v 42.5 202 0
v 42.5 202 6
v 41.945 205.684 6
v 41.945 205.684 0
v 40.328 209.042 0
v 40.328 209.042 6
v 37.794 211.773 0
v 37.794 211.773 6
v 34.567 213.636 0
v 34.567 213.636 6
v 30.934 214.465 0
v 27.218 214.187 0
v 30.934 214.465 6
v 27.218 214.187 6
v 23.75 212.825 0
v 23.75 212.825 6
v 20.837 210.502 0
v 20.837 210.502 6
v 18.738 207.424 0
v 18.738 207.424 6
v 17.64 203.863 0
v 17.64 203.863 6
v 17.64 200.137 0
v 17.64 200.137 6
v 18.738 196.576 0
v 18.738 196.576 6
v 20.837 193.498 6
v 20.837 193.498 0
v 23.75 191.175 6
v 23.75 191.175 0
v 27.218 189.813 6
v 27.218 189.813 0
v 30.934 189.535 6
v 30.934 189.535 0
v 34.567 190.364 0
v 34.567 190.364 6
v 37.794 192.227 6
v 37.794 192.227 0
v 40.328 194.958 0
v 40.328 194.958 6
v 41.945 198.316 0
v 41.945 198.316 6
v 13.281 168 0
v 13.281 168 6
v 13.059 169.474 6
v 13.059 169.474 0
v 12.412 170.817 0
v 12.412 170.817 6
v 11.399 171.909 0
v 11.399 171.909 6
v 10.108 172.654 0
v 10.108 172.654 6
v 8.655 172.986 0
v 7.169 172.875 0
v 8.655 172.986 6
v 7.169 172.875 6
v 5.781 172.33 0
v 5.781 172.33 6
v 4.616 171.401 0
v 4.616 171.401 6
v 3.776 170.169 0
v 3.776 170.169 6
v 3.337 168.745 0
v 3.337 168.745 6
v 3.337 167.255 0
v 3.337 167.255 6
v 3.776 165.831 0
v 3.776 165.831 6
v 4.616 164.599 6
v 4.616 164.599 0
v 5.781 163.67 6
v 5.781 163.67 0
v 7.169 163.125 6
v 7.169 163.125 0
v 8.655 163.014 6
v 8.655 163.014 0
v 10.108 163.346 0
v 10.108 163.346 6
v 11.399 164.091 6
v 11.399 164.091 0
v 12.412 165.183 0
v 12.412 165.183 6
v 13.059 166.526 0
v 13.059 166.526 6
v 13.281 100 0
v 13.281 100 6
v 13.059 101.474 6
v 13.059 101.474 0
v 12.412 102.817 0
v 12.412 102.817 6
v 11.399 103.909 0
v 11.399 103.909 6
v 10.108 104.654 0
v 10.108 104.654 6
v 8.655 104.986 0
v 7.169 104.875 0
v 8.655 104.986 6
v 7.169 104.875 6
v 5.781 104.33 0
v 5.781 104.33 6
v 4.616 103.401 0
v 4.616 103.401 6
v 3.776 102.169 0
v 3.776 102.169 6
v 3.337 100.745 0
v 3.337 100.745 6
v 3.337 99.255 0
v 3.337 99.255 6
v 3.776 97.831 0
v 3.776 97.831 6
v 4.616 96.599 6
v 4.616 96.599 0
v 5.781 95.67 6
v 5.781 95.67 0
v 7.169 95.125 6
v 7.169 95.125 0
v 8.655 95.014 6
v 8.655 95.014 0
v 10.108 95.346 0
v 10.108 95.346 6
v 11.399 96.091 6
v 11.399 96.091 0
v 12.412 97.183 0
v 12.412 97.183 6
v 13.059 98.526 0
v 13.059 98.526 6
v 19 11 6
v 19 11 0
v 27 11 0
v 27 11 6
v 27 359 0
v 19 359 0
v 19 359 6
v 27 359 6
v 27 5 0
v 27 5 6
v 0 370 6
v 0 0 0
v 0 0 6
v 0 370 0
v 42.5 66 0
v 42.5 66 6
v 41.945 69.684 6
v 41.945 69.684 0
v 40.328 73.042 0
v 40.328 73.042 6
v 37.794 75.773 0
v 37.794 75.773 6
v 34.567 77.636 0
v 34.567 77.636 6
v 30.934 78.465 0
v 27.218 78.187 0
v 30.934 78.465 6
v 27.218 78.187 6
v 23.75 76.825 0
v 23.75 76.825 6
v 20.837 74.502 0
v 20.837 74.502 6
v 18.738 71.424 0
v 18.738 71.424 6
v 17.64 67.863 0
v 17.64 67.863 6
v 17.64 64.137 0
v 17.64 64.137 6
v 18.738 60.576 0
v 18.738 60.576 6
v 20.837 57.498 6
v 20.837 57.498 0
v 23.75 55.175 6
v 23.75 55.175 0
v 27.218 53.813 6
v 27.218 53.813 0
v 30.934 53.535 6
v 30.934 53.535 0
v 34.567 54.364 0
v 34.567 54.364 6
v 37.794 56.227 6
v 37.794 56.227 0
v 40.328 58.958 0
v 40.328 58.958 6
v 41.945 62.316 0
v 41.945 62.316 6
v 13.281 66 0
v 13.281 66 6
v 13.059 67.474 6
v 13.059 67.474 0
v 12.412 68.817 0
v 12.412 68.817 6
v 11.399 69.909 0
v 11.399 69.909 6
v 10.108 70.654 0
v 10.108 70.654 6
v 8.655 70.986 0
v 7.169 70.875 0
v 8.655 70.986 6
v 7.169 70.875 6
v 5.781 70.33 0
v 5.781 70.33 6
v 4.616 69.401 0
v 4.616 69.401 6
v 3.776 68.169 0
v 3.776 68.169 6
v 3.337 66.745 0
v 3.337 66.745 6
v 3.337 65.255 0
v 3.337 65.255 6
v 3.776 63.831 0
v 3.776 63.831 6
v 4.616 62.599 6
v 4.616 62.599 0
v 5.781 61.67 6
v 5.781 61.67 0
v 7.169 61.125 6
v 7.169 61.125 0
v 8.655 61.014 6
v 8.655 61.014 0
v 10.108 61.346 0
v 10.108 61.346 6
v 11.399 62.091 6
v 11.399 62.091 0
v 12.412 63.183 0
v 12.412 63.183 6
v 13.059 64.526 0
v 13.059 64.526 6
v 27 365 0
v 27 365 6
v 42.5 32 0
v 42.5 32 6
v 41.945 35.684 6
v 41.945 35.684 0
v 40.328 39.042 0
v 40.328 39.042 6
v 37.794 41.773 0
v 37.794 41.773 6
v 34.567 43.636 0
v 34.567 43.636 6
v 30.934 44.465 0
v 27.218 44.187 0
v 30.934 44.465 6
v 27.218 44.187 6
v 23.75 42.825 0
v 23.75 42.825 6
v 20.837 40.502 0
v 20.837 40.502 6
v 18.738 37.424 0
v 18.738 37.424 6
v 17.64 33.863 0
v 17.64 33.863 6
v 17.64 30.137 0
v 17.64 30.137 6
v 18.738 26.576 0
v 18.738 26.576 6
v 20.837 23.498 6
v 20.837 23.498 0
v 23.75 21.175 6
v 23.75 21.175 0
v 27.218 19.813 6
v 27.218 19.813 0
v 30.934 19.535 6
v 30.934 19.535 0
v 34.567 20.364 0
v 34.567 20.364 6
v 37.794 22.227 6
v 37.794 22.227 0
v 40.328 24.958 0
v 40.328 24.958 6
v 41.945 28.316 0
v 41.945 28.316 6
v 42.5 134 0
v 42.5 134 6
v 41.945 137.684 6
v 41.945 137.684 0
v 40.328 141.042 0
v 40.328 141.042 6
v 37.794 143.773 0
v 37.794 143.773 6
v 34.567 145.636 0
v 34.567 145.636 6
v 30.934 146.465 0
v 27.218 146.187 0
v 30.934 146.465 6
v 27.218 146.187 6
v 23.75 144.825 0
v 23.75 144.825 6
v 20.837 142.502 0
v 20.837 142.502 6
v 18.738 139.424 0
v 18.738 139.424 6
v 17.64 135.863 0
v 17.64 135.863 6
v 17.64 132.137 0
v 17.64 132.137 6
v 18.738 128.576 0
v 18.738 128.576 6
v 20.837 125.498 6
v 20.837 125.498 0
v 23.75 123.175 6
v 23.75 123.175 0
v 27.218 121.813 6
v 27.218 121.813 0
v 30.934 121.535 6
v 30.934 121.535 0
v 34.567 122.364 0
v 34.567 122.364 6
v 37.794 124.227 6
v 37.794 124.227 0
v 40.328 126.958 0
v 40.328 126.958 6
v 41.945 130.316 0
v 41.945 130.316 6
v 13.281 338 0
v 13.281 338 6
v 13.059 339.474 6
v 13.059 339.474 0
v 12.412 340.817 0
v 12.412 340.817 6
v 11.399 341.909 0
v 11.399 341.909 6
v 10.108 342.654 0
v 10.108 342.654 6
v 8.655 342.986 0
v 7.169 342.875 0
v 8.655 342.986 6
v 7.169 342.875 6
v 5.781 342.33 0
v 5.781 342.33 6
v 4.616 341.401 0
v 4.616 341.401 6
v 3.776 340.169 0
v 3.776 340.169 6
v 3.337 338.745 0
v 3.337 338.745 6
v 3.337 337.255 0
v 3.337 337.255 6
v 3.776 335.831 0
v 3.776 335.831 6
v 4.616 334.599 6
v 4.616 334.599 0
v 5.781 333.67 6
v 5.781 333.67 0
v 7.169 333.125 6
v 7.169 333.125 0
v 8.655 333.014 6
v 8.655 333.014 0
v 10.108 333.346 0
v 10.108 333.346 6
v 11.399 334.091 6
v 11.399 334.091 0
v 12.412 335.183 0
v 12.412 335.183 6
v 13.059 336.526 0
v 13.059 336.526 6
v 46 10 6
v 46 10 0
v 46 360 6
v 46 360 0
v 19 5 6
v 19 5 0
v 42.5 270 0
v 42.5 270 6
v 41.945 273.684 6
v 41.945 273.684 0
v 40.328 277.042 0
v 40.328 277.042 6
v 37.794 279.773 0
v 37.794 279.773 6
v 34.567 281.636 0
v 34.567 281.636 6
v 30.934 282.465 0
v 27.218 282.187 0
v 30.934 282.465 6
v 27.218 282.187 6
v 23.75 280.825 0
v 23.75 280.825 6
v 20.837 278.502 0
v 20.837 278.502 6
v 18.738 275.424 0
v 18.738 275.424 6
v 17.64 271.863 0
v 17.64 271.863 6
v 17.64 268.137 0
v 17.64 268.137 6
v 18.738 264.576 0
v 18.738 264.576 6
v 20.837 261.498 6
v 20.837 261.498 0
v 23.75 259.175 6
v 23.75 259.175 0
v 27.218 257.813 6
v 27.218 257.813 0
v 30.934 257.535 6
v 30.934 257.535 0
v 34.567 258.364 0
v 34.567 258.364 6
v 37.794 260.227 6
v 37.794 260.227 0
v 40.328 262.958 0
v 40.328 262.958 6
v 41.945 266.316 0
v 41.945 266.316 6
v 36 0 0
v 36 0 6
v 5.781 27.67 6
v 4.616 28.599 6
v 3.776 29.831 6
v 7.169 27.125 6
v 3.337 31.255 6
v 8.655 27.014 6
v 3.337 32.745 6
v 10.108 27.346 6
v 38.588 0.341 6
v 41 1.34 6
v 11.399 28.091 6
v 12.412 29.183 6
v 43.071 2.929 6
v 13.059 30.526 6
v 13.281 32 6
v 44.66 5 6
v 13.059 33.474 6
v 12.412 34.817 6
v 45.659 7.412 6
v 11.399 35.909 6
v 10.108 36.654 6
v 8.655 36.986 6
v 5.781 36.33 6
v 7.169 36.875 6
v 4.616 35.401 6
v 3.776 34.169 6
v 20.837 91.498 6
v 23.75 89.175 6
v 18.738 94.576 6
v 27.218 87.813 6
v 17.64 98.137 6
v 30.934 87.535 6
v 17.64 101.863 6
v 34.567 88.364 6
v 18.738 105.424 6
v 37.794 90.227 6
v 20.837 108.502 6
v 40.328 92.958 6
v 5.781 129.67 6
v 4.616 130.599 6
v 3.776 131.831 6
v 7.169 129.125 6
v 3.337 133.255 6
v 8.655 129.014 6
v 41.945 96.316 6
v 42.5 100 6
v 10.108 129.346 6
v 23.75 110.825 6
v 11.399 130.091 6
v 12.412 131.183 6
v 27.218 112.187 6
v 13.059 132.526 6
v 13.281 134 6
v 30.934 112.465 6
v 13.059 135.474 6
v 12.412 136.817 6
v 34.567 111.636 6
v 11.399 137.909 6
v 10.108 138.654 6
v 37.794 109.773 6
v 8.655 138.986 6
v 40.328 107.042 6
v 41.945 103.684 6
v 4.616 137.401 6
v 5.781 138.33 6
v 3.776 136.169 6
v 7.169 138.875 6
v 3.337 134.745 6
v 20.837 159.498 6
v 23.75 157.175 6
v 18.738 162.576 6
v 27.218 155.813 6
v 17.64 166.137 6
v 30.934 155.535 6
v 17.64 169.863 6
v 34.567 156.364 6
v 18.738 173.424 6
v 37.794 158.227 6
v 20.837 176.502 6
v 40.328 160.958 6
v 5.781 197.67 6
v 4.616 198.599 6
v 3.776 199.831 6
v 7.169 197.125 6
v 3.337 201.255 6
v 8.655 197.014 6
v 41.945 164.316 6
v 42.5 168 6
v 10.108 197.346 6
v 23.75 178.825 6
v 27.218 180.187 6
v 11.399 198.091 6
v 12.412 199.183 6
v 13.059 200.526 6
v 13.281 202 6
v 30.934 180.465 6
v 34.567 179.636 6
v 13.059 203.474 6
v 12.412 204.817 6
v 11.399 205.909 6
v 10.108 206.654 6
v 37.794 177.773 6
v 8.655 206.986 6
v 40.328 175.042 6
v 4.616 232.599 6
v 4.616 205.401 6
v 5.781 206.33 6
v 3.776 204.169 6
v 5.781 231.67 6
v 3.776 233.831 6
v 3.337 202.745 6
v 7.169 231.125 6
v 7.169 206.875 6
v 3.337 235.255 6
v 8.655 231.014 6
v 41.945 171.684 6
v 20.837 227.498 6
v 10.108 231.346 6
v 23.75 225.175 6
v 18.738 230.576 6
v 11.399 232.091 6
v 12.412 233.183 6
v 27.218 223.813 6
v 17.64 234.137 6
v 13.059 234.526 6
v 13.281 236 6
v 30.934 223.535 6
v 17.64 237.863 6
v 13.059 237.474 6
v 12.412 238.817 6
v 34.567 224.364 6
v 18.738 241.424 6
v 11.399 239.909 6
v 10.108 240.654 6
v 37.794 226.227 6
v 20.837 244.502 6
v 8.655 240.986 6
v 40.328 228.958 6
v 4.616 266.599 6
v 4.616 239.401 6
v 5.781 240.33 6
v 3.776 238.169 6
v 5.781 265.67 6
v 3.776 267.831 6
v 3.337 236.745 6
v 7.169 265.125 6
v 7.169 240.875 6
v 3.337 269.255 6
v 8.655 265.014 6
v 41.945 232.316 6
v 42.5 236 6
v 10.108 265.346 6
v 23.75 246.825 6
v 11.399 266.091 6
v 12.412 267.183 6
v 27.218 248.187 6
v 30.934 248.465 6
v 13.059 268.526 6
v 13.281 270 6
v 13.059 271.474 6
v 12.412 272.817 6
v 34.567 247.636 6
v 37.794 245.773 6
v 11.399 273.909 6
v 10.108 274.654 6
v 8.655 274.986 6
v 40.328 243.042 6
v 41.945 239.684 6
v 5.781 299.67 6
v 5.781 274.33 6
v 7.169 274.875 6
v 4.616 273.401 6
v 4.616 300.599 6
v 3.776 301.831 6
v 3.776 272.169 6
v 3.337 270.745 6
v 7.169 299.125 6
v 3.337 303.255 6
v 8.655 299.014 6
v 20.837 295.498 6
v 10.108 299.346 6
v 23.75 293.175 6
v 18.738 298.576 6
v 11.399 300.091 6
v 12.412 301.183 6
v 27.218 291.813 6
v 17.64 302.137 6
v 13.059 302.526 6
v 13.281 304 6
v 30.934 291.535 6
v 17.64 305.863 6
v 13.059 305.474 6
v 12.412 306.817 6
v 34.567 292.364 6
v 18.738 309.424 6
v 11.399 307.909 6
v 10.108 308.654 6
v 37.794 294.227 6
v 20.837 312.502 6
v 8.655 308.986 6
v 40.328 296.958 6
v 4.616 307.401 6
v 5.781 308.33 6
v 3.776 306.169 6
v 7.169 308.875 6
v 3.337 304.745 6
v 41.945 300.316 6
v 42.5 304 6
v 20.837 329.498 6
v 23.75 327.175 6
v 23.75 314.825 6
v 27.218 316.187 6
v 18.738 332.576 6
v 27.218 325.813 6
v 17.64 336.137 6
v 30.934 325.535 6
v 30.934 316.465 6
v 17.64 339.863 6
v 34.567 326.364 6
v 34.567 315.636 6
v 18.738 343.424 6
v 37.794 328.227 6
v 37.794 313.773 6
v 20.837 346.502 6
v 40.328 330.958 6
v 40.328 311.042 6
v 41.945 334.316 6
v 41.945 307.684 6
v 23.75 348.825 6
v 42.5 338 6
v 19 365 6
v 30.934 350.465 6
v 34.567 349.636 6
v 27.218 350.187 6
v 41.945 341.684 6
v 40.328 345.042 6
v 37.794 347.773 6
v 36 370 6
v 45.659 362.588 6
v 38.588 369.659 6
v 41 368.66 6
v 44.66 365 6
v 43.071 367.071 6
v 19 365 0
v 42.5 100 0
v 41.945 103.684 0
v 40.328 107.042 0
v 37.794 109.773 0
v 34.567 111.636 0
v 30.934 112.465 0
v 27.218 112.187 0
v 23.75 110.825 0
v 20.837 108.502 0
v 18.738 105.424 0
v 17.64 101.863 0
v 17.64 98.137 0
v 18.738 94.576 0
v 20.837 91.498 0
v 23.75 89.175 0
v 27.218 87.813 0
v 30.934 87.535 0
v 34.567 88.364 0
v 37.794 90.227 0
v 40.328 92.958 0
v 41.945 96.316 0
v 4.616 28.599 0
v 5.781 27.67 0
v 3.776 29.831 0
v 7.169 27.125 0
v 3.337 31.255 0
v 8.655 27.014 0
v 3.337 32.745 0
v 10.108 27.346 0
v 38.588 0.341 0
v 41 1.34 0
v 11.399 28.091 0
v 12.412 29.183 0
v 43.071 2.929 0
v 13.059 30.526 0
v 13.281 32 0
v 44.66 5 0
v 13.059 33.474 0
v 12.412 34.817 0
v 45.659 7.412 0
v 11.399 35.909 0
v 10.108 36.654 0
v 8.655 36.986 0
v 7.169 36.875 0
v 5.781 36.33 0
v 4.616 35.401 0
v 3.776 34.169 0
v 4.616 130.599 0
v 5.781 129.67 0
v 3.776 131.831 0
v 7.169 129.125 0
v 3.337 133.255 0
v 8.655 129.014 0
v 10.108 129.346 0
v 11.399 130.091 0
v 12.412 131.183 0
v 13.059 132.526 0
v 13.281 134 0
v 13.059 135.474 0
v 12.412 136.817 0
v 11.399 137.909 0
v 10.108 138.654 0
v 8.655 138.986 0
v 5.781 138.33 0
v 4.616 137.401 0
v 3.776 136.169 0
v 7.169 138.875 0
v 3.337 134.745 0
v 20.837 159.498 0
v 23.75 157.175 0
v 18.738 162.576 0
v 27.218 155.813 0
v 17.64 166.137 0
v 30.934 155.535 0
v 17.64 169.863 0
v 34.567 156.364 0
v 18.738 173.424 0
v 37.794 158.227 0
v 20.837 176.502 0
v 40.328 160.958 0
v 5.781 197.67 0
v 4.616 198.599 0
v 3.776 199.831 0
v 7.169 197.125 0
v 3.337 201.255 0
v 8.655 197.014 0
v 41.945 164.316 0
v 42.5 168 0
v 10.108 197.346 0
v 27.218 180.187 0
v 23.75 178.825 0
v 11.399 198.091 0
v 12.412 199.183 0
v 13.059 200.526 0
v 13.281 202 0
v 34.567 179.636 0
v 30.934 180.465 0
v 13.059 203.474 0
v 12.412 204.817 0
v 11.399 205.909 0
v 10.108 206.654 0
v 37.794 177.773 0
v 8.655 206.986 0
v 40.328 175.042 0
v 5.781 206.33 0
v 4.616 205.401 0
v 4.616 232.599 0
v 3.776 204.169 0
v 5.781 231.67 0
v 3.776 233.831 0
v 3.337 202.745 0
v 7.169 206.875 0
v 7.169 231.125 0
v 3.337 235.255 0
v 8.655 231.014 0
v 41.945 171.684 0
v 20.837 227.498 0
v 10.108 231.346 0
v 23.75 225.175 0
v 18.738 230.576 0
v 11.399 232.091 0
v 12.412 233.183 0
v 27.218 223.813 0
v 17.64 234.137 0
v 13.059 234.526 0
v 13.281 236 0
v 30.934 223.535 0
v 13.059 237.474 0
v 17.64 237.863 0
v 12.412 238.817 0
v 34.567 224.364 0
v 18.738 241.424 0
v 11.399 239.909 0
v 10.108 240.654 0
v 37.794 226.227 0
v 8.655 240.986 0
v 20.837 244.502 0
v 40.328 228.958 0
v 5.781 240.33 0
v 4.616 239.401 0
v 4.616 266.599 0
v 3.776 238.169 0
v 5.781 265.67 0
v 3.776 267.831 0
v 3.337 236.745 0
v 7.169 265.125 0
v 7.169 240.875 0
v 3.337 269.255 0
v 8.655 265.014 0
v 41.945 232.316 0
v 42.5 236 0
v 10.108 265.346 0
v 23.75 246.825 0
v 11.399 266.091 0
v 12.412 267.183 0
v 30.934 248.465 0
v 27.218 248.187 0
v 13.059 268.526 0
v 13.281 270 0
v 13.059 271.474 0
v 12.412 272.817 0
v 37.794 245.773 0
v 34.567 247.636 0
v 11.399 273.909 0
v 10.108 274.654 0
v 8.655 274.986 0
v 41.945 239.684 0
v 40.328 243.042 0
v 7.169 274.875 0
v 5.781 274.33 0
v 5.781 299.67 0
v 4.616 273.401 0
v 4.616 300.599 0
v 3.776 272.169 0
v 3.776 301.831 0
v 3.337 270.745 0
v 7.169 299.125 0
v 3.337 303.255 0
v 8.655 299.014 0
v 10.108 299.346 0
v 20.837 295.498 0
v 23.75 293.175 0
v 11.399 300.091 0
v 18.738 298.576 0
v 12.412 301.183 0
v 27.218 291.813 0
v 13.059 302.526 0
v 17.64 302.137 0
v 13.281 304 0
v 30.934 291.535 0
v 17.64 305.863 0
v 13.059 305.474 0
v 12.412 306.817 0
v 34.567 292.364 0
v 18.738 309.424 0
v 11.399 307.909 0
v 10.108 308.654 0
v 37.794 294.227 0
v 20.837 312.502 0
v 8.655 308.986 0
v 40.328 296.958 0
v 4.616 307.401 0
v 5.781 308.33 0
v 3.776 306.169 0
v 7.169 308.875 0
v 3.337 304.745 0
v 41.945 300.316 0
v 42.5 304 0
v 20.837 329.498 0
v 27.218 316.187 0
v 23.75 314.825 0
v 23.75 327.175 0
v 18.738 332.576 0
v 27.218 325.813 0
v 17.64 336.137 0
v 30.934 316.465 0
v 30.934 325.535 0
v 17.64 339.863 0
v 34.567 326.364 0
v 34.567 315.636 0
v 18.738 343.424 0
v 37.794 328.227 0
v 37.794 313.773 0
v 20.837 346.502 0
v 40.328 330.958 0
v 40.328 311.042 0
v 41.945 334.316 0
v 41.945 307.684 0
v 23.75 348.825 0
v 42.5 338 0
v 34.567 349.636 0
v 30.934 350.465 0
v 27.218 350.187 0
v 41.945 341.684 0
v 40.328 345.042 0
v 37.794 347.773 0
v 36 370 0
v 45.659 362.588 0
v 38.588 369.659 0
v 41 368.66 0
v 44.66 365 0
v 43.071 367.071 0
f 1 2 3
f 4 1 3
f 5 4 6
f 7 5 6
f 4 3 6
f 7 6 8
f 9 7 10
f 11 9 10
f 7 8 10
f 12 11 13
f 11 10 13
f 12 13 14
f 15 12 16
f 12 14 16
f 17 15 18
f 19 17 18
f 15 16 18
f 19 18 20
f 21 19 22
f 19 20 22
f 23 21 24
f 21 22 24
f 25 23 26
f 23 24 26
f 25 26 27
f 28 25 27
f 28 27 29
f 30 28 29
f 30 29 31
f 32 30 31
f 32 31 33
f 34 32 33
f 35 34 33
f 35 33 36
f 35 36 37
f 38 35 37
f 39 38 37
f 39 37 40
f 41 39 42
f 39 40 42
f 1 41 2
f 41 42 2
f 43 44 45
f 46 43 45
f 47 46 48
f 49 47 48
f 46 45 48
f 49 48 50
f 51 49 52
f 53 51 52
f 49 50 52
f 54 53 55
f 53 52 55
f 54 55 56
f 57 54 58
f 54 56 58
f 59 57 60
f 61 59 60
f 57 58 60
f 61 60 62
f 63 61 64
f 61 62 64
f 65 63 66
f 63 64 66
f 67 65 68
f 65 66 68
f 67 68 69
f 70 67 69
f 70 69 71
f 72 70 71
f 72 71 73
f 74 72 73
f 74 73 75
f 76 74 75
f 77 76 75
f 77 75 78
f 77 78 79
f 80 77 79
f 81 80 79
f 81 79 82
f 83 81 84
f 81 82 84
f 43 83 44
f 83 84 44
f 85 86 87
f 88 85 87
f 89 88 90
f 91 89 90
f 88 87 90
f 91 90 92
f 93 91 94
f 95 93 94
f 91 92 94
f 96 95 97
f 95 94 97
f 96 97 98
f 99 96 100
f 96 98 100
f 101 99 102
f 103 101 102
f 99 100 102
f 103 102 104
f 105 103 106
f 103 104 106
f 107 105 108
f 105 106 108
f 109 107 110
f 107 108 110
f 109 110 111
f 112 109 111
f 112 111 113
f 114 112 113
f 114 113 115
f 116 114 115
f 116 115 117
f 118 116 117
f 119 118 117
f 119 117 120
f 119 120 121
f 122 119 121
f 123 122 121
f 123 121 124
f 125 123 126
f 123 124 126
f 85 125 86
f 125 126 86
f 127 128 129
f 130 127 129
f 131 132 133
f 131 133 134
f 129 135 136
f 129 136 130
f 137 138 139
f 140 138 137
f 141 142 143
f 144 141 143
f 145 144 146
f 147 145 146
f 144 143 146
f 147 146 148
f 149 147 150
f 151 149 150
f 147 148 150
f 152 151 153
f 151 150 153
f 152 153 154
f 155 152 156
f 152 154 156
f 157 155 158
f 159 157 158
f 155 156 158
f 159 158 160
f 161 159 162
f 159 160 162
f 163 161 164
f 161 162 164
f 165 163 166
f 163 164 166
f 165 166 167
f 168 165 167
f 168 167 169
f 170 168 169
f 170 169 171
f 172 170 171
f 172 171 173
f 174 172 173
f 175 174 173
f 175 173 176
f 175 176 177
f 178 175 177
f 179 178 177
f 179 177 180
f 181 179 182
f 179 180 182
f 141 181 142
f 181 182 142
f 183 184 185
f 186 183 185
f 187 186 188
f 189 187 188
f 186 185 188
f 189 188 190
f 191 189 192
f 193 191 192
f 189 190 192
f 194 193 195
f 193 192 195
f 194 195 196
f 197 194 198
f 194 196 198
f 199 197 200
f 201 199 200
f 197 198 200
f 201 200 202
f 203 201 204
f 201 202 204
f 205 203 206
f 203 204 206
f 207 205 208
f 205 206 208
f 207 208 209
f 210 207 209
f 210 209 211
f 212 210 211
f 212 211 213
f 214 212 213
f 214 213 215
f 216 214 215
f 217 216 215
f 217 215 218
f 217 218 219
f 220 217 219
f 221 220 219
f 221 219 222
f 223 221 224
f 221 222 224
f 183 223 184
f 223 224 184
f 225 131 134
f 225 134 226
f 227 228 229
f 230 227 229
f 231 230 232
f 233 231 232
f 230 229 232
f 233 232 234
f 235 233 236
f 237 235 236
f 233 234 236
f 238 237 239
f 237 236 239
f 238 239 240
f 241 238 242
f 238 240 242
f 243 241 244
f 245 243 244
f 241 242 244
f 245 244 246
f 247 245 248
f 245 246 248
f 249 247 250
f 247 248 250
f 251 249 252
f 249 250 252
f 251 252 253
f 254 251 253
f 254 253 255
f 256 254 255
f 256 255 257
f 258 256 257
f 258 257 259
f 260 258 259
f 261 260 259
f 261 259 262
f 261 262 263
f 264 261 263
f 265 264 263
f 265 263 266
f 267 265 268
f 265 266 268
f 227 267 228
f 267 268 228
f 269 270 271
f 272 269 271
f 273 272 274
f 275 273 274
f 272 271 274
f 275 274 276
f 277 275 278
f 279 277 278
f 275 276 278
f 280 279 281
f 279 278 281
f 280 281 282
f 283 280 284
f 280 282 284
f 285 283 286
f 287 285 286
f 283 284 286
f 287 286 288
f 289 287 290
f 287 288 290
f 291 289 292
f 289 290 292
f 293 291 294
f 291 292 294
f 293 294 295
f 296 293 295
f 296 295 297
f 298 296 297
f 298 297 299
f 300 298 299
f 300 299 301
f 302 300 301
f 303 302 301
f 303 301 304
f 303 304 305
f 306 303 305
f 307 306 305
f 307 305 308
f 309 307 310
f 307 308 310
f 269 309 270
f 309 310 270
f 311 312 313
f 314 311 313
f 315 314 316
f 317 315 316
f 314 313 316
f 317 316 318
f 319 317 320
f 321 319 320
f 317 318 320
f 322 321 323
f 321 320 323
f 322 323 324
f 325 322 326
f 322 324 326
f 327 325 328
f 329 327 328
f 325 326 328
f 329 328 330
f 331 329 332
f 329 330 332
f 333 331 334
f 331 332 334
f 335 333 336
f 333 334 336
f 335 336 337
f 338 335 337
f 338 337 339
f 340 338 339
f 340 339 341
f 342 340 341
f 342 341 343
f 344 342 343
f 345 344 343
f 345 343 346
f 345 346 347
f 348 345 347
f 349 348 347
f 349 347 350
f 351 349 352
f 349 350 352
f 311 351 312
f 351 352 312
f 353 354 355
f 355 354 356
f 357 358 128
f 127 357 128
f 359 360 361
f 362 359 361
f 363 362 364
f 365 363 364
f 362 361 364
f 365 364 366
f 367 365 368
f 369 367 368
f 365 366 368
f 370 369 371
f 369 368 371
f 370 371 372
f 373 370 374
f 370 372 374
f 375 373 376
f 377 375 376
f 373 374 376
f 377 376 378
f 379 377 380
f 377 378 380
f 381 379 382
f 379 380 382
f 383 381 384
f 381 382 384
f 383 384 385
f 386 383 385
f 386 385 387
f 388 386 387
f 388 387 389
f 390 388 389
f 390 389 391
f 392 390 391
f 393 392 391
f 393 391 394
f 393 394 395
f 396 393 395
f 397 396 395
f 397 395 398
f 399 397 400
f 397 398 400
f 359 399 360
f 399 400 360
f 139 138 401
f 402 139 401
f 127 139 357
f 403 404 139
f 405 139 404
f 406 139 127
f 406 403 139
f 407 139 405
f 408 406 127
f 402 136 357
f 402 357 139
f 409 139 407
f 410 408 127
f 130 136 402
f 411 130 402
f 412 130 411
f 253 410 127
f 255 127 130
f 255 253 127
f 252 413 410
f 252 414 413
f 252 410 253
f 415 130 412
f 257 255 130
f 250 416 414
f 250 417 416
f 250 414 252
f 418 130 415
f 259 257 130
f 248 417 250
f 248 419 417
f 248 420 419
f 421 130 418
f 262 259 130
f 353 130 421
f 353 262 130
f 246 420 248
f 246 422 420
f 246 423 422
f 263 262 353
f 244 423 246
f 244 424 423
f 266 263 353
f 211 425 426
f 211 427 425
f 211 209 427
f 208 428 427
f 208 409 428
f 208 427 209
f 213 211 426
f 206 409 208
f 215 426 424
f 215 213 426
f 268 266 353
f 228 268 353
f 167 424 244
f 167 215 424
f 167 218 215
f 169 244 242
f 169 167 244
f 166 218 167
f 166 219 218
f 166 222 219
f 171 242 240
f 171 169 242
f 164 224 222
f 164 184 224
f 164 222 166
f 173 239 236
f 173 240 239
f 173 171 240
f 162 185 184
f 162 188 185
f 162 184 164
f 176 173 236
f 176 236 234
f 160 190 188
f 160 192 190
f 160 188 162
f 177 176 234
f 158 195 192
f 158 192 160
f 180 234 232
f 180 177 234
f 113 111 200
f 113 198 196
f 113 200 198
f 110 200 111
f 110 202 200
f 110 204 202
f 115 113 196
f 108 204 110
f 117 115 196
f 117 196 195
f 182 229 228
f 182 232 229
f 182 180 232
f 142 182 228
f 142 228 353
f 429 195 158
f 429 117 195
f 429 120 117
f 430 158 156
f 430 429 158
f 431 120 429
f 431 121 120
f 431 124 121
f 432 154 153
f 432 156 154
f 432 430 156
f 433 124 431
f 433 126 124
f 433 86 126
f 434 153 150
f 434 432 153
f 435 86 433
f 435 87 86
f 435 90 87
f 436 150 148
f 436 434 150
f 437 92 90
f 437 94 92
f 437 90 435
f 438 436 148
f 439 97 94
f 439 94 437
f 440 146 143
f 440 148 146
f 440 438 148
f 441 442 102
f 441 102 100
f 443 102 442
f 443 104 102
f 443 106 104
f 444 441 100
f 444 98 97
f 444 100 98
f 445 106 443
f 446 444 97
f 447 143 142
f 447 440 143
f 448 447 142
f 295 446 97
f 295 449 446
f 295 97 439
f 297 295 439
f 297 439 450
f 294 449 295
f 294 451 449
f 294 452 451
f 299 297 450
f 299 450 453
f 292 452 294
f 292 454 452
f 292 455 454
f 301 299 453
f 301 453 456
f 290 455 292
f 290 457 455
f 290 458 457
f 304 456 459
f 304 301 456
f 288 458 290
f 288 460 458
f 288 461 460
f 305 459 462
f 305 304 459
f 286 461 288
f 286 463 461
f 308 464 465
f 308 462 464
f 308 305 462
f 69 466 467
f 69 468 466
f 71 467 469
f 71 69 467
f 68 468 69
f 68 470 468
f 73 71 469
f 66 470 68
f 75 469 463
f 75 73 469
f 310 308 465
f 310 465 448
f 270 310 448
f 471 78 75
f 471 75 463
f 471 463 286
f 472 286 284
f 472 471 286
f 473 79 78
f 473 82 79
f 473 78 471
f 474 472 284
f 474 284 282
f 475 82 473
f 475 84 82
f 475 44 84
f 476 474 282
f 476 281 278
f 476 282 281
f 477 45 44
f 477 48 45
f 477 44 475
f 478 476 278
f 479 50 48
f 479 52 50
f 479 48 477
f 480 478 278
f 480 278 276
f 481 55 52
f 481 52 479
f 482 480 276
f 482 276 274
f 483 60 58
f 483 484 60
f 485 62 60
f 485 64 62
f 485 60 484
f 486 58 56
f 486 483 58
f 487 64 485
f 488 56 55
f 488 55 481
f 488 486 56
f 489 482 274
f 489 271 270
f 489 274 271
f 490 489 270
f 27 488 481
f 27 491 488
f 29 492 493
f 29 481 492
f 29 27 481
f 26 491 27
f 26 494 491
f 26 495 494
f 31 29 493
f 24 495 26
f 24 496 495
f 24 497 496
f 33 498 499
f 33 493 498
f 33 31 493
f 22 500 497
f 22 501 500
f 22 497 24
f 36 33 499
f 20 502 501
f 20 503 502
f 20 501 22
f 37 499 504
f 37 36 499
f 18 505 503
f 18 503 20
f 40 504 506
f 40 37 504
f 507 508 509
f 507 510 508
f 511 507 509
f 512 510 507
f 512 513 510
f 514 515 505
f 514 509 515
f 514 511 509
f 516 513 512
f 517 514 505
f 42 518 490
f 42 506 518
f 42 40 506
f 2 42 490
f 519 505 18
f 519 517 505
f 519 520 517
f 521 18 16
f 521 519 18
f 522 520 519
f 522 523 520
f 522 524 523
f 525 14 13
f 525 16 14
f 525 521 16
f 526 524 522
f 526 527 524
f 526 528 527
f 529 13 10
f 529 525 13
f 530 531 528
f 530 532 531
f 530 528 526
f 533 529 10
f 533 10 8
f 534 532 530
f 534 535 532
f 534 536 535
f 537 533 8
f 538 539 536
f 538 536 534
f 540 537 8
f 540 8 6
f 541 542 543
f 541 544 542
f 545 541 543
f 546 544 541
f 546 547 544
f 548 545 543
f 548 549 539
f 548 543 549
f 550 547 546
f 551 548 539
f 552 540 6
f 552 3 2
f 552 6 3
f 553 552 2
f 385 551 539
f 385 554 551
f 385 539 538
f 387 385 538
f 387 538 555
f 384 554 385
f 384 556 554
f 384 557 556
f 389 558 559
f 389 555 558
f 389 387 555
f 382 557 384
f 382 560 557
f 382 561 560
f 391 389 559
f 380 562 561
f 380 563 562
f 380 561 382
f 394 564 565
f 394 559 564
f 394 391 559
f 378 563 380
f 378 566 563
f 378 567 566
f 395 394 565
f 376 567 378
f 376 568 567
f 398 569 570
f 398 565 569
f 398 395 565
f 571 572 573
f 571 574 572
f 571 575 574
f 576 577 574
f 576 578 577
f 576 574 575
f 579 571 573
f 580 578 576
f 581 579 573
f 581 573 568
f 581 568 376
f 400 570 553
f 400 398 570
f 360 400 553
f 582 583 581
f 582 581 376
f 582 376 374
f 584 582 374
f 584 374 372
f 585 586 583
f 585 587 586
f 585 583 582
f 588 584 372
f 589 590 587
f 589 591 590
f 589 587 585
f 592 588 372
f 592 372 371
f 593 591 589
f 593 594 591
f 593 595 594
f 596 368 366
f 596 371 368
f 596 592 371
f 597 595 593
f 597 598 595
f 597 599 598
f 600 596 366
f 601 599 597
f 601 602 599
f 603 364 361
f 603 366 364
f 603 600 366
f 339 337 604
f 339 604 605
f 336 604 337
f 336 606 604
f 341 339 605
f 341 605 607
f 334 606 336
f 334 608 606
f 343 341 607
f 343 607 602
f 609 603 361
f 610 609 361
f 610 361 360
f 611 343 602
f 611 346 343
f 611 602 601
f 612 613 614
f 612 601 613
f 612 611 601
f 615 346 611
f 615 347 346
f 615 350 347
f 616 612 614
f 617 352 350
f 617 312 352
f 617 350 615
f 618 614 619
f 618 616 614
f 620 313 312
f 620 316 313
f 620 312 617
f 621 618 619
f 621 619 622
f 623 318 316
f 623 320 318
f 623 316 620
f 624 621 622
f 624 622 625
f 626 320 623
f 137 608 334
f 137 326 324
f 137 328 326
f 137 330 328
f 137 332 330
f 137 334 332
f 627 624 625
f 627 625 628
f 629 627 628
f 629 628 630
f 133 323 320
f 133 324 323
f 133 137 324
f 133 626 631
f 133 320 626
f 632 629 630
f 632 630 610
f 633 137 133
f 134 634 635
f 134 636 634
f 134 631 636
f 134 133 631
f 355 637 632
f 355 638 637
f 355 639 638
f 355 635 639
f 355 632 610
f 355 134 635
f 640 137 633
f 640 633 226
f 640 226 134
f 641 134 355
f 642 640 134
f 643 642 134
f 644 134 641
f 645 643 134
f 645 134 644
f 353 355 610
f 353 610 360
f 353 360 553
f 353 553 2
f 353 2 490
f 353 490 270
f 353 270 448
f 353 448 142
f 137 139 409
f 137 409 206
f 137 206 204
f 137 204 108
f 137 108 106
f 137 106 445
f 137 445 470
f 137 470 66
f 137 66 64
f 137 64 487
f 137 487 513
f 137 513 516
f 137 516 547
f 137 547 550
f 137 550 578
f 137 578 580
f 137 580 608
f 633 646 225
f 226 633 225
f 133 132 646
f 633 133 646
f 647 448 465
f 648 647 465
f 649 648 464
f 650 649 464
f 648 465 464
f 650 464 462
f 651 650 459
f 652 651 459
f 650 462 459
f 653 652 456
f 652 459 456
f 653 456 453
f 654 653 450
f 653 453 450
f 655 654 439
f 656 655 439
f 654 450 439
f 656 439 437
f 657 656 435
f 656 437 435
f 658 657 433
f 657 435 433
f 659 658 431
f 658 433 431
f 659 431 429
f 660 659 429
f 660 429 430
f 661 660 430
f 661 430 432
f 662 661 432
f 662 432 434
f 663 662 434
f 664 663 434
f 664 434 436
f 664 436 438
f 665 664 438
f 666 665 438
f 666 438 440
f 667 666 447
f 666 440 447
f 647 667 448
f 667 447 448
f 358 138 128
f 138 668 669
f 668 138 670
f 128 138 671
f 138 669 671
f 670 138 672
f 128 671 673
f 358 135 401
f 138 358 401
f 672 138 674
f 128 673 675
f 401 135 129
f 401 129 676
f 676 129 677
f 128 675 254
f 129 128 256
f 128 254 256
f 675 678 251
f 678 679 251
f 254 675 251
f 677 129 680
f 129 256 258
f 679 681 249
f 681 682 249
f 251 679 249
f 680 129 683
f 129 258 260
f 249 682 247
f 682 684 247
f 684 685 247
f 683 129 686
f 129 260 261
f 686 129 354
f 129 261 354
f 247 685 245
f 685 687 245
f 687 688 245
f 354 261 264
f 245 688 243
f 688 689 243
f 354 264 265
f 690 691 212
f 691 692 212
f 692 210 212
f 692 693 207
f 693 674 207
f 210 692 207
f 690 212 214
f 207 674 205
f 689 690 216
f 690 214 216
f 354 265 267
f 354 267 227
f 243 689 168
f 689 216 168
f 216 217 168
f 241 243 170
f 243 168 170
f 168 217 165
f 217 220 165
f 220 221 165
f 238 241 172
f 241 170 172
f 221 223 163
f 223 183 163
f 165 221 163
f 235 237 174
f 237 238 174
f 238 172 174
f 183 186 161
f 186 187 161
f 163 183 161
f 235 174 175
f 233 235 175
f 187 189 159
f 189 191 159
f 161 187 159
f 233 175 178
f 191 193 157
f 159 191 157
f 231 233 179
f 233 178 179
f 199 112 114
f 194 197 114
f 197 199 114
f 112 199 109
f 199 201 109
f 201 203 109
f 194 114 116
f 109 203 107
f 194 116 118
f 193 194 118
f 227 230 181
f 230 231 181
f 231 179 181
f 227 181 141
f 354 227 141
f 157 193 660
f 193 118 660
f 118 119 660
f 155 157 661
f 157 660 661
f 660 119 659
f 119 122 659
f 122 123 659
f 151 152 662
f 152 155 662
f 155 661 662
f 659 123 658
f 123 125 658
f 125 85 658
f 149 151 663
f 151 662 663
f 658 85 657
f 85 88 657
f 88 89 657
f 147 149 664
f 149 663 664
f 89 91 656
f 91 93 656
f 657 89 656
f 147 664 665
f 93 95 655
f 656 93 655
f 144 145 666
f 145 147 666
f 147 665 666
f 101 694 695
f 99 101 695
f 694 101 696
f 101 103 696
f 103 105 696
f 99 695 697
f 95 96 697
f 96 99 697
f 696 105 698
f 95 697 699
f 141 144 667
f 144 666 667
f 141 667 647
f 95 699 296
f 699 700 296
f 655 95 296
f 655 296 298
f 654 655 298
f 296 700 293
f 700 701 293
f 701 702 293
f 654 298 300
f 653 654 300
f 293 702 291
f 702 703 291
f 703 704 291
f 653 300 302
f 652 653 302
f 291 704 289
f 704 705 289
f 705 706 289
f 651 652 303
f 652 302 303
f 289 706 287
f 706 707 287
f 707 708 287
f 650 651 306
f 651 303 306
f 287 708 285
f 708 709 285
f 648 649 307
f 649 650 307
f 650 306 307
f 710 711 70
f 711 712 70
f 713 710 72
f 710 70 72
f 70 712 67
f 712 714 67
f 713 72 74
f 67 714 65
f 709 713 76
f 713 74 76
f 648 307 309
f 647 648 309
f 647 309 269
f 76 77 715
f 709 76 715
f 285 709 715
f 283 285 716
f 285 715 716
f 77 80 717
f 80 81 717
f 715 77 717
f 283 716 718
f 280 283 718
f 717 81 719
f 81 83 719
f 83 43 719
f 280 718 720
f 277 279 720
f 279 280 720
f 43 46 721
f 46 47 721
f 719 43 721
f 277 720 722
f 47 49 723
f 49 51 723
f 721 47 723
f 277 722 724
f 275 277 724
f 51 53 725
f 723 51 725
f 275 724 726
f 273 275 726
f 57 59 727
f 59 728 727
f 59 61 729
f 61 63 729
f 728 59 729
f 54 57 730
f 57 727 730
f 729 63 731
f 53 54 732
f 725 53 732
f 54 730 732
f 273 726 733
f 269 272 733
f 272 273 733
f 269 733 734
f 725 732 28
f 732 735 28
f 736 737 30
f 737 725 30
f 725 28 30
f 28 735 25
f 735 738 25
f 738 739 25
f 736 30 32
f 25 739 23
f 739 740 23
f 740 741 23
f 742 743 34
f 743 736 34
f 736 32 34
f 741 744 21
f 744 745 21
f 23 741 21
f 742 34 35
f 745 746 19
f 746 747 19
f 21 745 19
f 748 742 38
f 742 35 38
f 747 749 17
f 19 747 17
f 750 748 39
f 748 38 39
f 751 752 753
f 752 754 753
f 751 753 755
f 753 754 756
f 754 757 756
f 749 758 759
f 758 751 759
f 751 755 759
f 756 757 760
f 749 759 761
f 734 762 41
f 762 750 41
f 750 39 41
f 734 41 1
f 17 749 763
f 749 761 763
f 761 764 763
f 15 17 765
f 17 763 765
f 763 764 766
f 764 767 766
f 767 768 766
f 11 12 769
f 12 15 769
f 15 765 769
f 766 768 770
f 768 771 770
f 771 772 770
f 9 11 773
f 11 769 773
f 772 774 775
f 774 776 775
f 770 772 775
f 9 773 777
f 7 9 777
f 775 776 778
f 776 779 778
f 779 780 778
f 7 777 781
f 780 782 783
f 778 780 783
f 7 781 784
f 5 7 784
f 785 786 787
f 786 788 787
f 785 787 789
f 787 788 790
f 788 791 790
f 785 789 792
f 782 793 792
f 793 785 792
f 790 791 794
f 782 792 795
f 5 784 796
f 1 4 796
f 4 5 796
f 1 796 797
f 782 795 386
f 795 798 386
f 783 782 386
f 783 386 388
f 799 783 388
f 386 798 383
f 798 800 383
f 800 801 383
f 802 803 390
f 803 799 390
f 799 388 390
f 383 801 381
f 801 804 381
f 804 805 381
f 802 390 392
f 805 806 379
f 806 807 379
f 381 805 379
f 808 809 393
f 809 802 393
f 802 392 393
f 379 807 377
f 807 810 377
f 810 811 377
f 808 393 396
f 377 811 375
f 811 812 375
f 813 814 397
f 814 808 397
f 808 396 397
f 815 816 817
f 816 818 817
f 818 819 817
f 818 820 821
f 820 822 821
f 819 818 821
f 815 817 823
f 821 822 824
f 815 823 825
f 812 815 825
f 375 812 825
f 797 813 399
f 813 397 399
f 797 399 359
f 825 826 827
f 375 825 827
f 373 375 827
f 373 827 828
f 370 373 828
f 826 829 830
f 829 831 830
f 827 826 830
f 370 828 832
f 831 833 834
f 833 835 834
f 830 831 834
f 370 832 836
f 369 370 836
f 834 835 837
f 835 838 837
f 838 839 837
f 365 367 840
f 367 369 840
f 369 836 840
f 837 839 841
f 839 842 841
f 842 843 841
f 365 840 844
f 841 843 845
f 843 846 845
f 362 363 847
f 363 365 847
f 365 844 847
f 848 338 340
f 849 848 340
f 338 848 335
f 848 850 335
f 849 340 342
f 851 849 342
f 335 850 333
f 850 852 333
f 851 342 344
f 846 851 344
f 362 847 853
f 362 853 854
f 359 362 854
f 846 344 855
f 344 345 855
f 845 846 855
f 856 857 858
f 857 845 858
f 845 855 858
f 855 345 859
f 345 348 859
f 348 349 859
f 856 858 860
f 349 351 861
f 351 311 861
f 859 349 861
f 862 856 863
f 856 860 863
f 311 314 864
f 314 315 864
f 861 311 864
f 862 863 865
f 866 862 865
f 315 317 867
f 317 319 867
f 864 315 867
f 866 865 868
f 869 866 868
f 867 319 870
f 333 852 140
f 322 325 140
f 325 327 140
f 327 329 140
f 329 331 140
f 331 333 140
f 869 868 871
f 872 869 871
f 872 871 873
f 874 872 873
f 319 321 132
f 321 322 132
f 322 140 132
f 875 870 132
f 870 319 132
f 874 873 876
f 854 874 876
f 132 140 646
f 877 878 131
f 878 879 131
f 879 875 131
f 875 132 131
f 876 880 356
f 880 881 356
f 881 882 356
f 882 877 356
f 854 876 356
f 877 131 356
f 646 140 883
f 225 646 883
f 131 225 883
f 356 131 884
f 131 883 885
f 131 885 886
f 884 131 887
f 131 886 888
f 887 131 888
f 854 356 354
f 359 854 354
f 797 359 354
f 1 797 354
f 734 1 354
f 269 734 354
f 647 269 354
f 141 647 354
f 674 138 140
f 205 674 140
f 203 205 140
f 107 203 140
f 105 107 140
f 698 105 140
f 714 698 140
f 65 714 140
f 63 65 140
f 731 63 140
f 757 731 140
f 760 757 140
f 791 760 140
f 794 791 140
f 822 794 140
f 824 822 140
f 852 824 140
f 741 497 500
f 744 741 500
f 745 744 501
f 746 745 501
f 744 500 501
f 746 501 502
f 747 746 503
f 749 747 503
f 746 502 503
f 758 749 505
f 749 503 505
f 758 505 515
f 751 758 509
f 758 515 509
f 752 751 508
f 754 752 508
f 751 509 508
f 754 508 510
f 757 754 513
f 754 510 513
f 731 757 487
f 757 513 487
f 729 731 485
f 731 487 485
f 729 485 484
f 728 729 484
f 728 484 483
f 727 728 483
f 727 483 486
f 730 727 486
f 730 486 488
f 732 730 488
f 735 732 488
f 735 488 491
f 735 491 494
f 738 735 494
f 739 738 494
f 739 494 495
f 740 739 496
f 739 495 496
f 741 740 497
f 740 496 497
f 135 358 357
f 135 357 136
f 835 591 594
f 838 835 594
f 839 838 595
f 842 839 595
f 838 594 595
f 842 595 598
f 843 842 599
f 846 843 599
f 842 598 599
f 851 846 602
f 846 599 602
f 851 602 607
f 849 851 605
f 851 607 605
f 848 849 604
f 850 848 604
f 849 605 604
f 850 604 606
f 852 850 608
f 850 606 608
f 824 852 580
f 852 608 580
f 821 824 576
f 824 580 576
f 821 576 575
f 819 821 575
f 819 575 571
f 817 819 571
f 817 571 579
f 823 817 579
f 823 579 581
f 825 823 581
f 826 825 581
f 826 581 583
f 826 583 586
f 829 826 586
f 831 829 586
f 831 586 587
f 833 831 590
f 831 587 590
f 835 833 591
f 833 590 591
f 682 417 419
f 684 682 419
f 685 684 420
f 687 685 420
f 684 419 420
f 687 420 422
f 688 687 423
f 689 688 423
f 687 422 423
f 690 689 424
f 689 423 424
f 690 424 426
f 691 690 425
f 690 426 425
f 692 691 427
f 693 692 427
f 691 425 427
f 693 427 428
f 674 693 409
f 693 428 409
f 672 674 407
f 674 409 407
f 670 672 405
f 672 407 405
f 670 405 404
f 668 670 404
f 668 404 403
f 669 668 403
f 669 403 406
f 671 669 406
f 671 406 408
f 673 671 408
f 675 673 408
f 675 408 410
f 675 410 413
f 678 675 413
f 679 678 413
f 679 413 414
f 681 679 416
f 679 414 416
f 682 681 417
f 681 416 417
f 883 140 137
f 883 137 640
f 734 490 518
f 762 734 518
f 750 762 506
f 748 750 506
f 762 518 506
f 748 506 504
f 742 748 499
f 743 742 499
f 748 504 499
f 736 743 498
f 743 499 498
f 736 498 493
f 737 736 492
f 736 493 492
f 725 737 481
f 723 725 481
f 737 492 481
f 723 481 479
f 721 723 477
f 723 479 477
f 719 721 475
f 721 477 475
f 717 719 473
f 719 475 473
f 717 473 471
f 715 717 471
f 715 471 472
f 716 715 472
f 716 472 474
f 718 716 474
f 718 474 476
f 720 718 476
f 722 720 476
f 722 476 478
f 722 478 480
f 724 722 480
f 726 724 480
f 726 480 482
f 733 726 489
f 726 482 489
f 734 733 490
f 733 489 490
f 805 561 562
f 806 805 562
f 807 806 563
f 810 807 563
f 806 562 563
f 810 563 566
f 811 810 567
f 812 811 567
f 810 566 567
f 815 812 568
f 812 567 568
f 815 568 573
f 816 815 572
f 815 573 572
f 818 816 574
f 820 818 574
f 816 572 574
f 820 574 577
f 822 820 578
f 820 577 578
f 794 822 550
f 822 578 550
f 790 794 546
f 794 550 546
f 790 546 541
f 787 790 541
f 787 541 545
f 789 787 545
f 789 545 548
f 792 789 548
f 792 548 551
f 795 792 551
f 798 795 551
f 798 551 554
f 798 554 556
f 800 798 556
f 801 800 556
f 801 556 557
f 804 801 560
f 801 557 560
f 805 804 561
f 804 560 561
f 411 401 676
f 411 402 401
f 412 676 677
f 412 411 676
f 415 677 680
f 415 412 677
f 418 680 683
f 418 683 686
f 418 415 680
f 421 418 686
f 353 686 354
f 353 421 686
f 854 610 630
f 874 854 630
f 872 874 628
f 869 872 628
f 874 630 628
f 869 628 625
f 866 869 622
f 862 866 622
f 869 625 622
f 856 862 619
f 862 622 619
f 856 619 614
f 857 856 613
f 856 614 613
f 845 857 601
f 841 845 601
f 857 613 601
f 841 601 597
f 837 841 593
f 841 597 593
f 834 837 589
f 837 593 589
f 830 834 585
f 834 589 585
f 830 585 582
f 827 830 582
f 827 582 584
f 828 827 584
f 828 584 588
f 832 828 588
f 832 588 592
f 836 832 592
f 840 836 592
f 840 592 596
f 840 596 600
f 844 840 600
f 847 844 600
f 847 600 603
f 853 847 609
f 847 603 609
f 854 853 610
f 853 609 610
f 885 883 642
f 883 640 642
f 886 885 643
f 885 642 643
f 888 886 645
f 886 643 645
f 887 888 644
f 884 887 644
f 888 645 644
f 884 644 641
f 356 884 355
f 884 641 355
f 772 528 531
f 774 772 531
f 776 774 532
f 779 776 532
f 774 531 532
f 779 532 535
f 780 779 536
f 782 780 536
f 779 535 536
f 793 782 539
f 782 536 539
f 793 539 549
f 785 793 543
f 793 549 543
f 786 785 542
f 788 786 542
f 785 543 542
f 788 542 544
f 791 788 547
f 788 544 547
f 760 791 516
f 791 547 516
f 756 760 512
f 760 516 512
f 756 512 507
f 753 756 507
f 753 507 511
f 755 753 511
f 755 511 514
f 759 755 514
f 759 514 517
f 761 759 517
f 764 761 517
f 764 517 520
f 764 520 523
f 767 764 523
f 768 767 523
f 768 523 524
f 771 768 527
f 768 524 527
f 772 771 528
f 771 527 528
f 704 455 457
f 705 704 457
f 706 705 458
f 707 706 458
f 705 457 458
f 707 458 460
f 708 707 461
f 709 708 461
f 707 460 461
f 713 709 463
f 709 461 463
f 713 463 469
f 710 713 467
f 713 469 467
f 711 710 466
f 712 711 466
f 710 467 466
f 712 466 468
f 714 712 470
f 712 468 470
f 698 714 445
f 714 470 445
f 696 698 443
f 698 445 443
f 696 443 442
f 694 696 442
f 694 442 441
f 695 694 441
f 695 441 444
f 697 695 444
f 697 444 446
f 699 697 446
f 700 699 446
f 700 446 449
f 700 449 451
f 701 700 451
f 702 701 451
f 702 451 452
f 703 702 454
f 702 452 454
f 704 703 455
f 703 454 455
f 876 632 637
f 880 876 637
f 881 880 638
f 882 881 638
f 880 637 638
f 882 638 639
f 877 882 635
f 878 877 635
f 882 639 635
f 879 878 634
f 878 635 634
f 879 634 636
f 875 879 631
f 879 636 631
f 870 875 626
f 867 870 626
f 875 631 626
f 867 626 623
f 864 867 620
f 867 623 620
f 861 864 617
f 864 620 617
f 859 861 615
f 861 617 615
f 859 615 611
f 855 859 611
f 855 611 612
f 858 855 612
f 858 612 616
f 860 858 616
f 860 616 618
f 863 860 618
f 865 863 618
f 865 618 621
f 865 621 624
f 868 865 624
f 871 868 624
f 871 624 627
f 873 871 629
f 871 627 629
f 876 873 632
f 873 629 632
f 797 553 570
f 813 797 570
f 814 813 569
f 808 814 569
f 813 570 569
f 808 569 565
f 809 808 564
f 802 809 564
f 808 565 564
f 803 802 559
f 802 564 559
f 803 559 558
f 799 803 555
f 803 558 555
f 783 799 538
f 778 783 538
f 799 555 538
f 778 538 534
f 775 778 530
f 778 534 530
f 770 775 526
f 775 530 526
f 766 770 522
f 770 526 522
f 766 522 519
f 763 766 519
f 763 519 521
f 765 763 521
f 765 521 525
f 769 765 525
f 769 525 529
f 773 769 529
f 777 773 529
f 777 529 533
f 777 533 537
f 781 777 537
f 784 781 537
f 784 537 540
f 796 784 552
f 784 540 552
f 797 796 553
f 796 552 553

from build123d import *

# Parameters (mm, degrees)
ESQUISSE1_W             = 46
ESQUISSE1_H             = 370
ESQUISSE1_W_2           = 8
ESQUISSE1_H_2           = 6
BOSS_EXTRU_1_DEPTH      = 6
ESQUISSE2_R             = 12.5
ESQUISSE2_R_2           = 5
ENL_V_MAT_EXTRU_1_DEPTH = 6
CONG_1_R                = 10


with BuildPart() as part:
    # Esquisse1 → Boss.-Extru.1 (new body)
    with BuildSketch(Plane.XY):
        with Locations((23, 185)):
            Rectangle(ESQUISSE1_W, ESQUISSE1_H)
        with Locations((23, 8)):
            Rectangle(ESQUISSE1_W_2, ESQUISSE1_H_2, mode=Mode.SUBTRACT)
        with Locations((23, 362)):
            Rectangle(ESQUISSE1_W_2, ESQUISSE1_H_2, mode=Mode.SUBTRACT)
    extrude(amount=BOSS_EXTRU_1_DEPTH)

    # Esquisse2 → Enlèv. mat.-Extru.1 (cut)
    with BuildSketch(Plane.XY.offset(6)):
        with Locations((30, 32)):
            Circle(ESQUISSE2_R)
        with Locations((30, 66)):
            Circle(ESQUISSE2_R)
        with Locations((30, 100)):
            Circle(ESQUISSE2_R)
        with Locations((30, 134)):
            Circle(ESQUISSE2_R)
        with Locations((30, 168)):
            Circle(ESQUISSE2_R)
        with Locations((30, 202)):
            Circle(ESQUISSE2_R)
        with Locations((30, 236)):
            Circle(ESQUISSE2_R)
        with Locations((30, 270)):
            Circle(ESQUISSE2_R)
        with Locations((30, 304)):
            Circle(ESQUISSE2_R)
        with Locations((8.281143203, 338)):
            Circle(ESQUISSE2_R_2)
        with Locations((8.281143203, 304)):
            Circle(ESQUISSE2_R_2)
        with Locations((8.281143203, 270)):
            Circle(ESQUISSE2_R_2)
        with Locations((8.281143203, 236)):
            Circle(ESQUISSE2_R_2)
        with Locations((8.281143203, 202)):
            Circle(ESQUISSE2_R_2)
        with Locations((8.281143203, 168)):
            Circle(ESQUISSE2_R_2)
        with Locations((8.281143203, 134)):
            Circle(ESQUISSE2_R_2)
        with Locations((8.281143203, 100)):
            Circle(ESQUISSE2_R_2)
        with Locations((8.281143203, 66)):
            Circle(ESQUISSE2_R_2)
        with Locations((30, 338)):
            Circle(ESQUISSE2_R)
        with Locations((8.281143203, 32)):
            Circle(ESQUISSE2_R_2)
    extrude(amount=-ENL_V_MAT_EXTRU_1_DEPTH, mode=Mode.SUBTRACT)

    # Congé1
    cong_1_edges = [part.edges().sort_by_distance(p)[0] for p in [
        (46, 370, 3),
        (46, 0, 3),
    ]]
    fillet(cong_1_edges, radius=CONG_1_R)


solid = part.part
